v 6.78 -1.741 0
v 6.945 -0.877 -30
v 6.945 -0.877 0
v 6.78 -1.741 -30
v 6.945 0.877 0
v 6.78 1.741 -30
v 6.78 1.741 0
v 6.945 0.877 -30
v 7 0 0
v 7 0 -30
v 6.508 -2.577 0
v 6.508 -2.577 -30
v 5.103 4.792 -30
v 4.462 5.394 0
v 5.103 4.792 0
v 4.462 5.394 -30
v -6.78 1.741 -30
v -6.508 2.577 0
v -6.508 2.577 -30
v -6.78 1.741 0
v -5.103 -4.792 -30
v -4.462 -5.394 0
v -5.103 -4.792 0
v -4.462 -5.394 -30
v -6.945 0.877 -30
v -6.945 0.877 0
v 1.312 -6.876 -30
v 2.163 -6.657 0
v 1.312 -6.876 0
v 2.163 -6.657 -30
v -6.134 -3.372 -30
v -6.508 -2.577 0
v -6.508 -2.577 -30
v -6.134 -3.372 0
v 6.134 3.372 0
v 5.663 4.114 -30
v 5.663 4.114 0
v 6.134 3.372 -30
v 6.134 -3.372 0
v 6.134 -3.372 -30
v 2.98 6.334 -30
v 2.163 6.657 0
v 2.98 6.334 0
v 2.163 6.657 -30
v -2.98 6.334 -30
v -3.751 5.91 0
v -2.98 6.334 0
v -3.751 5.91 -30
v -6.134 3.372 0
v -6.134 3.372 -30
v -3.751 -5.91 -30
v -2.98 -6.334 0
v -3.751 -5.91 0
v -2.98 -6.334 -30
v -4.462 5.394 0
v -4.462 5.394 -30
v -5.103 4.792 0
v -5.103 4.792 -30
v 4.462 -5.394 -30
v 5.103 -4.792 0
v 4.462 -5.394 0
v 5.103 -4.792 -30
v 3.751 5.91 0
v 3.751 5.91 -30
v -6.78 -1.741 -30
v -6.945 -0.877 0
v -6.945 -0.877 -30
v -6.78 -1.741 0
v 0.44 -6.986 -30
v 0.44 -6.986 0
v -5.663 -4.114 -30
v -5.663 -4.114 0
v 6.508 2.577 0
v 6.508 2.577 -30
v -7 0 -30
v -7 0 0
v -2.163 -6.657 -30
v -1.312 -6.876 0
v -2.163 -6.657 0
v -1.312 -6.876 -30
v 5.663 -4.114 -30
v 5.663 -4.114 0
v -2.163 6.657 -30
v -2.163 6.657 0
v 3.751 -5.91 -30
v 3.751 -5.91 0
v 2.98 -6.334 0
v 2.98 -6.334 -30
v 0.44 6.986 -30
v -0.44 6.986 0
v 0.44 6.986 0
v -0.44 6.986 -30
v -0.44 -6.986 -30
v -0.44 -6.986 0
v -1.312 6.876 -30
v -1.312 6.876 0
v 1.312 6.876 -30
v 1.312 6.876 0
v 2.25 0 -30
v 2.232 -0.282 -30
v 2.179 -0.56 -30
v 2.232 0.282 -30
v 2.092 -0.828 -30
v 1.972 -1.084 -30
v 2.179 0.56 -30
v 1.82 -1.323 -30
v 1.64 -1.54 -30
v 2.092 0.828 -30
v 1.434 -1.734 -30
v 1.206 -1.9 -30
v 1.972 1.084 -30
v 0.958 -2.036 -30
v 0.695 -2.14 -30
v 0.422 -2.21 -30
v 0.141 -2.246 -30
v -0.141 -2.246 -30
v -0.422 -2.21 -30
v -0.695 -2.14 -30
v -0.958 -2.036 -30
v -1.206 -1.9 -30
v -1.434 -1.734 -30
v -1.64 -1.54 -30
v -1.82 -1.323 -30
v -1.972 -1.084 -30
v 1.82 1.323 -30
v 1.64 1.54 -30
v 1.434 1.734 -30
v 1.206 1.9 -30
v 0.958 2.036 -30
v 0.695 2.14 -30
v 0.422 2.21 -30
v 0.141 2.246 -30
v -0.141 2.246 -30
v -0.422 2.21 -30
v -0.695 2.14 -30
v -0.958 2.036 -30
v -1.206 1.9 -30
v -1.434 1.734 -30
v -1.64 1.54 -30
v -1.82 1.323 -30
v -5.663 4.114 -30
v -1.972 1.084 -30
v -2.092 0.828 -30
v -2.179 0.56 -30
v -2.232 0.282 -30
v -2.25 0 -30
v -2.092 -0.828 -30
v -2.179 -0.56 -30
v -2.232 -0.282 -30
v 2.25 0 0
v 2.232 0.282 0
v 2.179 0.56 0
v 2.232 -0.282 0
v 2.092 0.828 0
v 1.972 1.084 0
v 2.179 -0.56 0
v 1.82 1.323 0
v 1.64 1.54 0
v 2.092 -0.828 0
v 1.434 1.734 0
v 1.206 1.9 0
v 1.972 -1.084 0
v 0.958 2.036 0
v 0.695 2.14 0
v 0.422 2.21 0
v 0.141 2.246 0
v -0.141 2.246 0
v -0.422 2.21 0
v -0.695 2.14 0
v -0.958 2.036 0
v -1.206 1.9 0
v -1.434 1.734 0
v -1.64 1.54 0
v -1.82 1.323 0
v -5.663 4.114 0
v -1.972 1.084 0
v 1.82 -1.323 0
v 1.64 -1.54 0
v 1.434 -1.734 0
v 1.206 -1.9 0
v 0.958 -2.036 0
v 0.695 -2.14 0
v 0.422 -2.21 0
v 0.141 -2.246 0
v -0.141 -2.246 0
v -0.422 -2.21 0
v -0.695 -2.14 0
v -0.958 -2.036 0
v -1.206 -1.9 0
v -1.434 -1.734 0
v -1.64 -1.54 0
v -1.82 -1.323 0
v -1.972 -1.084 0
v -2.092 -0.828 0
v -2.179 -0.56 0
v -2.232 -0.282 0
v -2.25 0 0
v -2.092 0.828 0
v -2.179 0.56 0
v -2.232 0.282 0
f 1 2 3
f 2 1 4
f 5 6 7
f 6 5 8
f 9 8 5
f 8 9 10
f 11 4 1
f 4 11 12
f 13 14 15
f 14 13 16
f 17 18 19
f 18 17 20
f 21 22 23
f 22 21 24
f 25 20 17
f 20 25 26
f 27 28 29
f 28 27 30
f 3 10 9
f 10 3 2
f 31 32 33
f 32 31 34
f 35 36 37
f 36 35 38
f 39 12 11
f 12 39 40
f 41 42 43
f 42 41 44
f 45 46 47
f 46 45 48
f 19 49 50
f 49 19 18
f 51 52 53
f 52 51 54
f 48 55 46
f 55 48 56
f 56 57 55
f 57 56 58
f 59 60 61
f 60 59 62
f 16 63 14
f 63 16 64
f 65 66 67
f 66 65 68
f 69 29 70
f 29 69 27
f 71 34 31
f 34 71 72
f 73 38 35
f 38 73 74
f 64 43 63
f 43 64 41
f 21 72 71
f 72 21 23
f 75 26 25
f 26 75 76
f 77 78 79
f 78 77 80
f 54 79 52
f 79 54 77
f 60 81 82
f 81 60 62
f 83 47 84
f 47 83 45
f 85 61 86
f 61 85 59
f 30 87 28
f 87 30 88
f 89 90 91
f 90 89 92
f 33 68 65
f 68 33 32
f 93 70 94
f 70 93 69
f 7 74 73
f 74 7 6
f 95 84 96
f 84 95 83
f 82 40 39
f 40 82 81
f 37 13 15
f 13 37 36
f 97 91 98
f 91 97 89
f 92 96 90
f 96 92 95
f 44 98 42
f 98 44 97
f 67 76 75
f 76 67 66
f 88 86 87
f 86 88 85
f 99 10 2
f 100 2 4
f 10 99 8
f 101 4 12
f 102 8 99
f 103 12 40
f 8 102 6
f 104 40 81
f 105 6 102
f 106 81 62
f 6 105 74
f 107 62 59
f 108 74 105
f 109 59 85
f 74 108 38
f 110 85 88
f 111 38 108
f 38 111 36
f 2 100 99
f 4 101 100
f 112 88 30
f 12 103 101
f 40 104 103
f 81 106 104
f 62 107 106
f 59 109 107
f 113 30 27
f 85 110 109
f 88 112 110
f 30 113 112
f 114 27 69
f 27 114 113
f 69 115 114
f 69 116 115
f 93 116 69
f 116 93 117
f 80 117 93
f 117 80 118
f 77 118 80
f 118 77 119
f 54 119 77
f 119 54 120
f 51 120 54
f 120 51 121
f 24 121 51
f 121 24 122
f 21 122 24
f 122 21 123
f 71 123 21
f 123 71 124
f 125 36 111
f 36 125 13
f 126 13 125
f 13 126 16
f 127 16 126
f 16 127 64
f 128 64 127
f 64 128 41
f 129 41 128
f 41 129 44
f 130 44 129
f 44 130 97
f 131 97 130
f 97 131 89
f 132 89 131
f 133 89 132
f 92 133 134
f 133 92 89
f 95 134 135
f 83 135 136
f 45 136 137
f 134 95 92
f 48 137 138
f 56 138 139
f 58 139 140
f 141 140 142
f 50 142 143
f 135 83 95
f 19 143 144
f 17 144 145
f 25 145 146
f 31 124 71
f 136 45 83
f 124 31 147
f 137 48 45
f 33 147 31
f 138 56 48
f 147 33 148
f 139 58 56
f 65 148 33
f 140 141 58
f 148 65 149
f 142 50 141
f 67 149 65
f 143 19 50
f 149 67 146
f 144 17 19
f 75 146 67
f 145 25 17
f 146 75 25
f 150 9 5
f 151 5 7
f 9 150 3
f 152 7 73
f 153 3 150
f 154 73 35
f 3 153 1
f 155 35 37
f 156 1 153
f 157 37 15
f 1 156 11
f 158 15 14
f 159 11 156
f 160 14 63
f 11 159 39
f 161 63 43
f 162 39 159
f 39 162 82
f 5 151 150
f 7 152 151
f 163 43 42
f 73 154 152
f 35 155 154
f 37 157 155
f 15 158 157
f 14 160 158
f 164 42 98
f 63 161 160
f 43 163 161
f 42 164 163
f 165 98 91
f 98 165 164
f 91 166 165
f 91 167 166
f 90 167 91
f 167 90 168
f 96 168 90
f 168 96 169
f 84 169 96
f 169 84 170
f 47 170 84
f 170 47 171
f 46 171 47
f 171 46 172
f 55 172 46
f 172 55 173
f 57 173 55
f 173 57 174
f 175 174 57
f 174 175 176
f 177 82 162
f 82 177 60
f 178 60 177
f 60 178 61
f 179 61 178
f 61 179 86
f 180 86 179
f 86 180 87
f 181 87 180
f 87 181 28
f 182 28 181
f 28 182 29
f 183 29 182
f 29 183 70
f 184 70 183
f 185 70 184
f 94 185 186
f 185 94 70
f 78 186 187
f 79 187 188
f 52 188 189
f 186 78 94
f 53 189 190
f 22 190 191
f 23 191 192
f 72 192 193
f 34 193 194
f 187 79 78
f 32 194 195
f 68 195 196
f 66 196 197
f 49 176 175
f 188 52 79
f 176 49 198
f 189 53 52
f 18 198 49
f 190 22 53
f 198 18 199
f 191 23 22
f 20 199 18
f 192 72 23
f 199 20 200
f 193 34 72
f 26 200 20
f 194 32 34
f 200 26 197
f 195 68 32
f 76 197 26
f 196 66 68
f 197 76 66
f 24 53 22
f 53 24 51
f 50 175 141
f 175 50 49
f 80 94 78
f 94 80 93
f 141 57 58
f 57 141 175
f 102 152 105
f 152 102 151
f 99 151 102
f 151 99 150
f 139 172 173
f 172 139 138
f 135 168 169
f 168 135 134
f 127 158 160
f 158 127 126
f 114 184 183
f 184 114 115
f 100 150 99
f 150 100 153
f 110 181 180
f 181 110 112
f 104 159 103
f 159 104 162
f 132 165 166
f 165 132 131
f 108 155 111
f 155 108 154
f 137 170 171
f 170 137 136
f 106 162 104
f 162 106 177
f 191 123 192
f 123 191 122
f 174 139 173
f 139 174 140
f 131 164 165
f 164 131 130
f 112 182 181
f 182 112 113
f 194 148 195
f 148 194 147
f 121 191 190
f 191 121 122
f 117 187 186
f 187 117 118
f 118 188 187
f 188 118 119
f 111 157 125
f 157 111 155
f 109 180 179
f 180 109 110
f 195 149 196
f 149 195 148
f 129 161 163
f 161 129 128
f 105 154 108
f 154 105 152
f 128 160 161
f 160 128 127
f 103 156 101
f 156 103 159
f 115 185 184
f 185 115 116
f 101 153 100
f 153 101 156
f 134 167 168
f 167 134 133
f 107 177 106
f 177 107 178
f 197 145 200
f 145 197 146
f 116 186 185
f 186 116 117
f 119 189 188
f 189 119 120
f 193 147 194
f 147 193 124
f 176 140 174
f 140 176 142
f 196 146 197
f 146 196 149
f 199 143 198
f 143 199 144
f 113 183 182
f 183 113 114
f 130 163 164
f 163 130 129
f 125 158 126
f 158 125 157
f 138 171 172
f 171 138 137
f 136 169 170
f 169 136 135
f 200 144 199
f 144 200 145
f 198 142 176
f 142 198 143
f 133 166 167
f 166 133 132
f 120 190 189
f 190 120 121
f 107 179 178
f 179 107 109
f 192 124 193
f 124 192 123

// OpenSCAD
$fn = 50;


difference() {
	union() {
		translate(v = [0, 0, -30.0000000000]) {
			cylinder(h = 30, r = 7.0000000000);
		}
	}
	union() {
		#translate(v = [0, 0, -30]) {
			cylinder(h = 30, r = 2.2500000000);
		}
	}
}
